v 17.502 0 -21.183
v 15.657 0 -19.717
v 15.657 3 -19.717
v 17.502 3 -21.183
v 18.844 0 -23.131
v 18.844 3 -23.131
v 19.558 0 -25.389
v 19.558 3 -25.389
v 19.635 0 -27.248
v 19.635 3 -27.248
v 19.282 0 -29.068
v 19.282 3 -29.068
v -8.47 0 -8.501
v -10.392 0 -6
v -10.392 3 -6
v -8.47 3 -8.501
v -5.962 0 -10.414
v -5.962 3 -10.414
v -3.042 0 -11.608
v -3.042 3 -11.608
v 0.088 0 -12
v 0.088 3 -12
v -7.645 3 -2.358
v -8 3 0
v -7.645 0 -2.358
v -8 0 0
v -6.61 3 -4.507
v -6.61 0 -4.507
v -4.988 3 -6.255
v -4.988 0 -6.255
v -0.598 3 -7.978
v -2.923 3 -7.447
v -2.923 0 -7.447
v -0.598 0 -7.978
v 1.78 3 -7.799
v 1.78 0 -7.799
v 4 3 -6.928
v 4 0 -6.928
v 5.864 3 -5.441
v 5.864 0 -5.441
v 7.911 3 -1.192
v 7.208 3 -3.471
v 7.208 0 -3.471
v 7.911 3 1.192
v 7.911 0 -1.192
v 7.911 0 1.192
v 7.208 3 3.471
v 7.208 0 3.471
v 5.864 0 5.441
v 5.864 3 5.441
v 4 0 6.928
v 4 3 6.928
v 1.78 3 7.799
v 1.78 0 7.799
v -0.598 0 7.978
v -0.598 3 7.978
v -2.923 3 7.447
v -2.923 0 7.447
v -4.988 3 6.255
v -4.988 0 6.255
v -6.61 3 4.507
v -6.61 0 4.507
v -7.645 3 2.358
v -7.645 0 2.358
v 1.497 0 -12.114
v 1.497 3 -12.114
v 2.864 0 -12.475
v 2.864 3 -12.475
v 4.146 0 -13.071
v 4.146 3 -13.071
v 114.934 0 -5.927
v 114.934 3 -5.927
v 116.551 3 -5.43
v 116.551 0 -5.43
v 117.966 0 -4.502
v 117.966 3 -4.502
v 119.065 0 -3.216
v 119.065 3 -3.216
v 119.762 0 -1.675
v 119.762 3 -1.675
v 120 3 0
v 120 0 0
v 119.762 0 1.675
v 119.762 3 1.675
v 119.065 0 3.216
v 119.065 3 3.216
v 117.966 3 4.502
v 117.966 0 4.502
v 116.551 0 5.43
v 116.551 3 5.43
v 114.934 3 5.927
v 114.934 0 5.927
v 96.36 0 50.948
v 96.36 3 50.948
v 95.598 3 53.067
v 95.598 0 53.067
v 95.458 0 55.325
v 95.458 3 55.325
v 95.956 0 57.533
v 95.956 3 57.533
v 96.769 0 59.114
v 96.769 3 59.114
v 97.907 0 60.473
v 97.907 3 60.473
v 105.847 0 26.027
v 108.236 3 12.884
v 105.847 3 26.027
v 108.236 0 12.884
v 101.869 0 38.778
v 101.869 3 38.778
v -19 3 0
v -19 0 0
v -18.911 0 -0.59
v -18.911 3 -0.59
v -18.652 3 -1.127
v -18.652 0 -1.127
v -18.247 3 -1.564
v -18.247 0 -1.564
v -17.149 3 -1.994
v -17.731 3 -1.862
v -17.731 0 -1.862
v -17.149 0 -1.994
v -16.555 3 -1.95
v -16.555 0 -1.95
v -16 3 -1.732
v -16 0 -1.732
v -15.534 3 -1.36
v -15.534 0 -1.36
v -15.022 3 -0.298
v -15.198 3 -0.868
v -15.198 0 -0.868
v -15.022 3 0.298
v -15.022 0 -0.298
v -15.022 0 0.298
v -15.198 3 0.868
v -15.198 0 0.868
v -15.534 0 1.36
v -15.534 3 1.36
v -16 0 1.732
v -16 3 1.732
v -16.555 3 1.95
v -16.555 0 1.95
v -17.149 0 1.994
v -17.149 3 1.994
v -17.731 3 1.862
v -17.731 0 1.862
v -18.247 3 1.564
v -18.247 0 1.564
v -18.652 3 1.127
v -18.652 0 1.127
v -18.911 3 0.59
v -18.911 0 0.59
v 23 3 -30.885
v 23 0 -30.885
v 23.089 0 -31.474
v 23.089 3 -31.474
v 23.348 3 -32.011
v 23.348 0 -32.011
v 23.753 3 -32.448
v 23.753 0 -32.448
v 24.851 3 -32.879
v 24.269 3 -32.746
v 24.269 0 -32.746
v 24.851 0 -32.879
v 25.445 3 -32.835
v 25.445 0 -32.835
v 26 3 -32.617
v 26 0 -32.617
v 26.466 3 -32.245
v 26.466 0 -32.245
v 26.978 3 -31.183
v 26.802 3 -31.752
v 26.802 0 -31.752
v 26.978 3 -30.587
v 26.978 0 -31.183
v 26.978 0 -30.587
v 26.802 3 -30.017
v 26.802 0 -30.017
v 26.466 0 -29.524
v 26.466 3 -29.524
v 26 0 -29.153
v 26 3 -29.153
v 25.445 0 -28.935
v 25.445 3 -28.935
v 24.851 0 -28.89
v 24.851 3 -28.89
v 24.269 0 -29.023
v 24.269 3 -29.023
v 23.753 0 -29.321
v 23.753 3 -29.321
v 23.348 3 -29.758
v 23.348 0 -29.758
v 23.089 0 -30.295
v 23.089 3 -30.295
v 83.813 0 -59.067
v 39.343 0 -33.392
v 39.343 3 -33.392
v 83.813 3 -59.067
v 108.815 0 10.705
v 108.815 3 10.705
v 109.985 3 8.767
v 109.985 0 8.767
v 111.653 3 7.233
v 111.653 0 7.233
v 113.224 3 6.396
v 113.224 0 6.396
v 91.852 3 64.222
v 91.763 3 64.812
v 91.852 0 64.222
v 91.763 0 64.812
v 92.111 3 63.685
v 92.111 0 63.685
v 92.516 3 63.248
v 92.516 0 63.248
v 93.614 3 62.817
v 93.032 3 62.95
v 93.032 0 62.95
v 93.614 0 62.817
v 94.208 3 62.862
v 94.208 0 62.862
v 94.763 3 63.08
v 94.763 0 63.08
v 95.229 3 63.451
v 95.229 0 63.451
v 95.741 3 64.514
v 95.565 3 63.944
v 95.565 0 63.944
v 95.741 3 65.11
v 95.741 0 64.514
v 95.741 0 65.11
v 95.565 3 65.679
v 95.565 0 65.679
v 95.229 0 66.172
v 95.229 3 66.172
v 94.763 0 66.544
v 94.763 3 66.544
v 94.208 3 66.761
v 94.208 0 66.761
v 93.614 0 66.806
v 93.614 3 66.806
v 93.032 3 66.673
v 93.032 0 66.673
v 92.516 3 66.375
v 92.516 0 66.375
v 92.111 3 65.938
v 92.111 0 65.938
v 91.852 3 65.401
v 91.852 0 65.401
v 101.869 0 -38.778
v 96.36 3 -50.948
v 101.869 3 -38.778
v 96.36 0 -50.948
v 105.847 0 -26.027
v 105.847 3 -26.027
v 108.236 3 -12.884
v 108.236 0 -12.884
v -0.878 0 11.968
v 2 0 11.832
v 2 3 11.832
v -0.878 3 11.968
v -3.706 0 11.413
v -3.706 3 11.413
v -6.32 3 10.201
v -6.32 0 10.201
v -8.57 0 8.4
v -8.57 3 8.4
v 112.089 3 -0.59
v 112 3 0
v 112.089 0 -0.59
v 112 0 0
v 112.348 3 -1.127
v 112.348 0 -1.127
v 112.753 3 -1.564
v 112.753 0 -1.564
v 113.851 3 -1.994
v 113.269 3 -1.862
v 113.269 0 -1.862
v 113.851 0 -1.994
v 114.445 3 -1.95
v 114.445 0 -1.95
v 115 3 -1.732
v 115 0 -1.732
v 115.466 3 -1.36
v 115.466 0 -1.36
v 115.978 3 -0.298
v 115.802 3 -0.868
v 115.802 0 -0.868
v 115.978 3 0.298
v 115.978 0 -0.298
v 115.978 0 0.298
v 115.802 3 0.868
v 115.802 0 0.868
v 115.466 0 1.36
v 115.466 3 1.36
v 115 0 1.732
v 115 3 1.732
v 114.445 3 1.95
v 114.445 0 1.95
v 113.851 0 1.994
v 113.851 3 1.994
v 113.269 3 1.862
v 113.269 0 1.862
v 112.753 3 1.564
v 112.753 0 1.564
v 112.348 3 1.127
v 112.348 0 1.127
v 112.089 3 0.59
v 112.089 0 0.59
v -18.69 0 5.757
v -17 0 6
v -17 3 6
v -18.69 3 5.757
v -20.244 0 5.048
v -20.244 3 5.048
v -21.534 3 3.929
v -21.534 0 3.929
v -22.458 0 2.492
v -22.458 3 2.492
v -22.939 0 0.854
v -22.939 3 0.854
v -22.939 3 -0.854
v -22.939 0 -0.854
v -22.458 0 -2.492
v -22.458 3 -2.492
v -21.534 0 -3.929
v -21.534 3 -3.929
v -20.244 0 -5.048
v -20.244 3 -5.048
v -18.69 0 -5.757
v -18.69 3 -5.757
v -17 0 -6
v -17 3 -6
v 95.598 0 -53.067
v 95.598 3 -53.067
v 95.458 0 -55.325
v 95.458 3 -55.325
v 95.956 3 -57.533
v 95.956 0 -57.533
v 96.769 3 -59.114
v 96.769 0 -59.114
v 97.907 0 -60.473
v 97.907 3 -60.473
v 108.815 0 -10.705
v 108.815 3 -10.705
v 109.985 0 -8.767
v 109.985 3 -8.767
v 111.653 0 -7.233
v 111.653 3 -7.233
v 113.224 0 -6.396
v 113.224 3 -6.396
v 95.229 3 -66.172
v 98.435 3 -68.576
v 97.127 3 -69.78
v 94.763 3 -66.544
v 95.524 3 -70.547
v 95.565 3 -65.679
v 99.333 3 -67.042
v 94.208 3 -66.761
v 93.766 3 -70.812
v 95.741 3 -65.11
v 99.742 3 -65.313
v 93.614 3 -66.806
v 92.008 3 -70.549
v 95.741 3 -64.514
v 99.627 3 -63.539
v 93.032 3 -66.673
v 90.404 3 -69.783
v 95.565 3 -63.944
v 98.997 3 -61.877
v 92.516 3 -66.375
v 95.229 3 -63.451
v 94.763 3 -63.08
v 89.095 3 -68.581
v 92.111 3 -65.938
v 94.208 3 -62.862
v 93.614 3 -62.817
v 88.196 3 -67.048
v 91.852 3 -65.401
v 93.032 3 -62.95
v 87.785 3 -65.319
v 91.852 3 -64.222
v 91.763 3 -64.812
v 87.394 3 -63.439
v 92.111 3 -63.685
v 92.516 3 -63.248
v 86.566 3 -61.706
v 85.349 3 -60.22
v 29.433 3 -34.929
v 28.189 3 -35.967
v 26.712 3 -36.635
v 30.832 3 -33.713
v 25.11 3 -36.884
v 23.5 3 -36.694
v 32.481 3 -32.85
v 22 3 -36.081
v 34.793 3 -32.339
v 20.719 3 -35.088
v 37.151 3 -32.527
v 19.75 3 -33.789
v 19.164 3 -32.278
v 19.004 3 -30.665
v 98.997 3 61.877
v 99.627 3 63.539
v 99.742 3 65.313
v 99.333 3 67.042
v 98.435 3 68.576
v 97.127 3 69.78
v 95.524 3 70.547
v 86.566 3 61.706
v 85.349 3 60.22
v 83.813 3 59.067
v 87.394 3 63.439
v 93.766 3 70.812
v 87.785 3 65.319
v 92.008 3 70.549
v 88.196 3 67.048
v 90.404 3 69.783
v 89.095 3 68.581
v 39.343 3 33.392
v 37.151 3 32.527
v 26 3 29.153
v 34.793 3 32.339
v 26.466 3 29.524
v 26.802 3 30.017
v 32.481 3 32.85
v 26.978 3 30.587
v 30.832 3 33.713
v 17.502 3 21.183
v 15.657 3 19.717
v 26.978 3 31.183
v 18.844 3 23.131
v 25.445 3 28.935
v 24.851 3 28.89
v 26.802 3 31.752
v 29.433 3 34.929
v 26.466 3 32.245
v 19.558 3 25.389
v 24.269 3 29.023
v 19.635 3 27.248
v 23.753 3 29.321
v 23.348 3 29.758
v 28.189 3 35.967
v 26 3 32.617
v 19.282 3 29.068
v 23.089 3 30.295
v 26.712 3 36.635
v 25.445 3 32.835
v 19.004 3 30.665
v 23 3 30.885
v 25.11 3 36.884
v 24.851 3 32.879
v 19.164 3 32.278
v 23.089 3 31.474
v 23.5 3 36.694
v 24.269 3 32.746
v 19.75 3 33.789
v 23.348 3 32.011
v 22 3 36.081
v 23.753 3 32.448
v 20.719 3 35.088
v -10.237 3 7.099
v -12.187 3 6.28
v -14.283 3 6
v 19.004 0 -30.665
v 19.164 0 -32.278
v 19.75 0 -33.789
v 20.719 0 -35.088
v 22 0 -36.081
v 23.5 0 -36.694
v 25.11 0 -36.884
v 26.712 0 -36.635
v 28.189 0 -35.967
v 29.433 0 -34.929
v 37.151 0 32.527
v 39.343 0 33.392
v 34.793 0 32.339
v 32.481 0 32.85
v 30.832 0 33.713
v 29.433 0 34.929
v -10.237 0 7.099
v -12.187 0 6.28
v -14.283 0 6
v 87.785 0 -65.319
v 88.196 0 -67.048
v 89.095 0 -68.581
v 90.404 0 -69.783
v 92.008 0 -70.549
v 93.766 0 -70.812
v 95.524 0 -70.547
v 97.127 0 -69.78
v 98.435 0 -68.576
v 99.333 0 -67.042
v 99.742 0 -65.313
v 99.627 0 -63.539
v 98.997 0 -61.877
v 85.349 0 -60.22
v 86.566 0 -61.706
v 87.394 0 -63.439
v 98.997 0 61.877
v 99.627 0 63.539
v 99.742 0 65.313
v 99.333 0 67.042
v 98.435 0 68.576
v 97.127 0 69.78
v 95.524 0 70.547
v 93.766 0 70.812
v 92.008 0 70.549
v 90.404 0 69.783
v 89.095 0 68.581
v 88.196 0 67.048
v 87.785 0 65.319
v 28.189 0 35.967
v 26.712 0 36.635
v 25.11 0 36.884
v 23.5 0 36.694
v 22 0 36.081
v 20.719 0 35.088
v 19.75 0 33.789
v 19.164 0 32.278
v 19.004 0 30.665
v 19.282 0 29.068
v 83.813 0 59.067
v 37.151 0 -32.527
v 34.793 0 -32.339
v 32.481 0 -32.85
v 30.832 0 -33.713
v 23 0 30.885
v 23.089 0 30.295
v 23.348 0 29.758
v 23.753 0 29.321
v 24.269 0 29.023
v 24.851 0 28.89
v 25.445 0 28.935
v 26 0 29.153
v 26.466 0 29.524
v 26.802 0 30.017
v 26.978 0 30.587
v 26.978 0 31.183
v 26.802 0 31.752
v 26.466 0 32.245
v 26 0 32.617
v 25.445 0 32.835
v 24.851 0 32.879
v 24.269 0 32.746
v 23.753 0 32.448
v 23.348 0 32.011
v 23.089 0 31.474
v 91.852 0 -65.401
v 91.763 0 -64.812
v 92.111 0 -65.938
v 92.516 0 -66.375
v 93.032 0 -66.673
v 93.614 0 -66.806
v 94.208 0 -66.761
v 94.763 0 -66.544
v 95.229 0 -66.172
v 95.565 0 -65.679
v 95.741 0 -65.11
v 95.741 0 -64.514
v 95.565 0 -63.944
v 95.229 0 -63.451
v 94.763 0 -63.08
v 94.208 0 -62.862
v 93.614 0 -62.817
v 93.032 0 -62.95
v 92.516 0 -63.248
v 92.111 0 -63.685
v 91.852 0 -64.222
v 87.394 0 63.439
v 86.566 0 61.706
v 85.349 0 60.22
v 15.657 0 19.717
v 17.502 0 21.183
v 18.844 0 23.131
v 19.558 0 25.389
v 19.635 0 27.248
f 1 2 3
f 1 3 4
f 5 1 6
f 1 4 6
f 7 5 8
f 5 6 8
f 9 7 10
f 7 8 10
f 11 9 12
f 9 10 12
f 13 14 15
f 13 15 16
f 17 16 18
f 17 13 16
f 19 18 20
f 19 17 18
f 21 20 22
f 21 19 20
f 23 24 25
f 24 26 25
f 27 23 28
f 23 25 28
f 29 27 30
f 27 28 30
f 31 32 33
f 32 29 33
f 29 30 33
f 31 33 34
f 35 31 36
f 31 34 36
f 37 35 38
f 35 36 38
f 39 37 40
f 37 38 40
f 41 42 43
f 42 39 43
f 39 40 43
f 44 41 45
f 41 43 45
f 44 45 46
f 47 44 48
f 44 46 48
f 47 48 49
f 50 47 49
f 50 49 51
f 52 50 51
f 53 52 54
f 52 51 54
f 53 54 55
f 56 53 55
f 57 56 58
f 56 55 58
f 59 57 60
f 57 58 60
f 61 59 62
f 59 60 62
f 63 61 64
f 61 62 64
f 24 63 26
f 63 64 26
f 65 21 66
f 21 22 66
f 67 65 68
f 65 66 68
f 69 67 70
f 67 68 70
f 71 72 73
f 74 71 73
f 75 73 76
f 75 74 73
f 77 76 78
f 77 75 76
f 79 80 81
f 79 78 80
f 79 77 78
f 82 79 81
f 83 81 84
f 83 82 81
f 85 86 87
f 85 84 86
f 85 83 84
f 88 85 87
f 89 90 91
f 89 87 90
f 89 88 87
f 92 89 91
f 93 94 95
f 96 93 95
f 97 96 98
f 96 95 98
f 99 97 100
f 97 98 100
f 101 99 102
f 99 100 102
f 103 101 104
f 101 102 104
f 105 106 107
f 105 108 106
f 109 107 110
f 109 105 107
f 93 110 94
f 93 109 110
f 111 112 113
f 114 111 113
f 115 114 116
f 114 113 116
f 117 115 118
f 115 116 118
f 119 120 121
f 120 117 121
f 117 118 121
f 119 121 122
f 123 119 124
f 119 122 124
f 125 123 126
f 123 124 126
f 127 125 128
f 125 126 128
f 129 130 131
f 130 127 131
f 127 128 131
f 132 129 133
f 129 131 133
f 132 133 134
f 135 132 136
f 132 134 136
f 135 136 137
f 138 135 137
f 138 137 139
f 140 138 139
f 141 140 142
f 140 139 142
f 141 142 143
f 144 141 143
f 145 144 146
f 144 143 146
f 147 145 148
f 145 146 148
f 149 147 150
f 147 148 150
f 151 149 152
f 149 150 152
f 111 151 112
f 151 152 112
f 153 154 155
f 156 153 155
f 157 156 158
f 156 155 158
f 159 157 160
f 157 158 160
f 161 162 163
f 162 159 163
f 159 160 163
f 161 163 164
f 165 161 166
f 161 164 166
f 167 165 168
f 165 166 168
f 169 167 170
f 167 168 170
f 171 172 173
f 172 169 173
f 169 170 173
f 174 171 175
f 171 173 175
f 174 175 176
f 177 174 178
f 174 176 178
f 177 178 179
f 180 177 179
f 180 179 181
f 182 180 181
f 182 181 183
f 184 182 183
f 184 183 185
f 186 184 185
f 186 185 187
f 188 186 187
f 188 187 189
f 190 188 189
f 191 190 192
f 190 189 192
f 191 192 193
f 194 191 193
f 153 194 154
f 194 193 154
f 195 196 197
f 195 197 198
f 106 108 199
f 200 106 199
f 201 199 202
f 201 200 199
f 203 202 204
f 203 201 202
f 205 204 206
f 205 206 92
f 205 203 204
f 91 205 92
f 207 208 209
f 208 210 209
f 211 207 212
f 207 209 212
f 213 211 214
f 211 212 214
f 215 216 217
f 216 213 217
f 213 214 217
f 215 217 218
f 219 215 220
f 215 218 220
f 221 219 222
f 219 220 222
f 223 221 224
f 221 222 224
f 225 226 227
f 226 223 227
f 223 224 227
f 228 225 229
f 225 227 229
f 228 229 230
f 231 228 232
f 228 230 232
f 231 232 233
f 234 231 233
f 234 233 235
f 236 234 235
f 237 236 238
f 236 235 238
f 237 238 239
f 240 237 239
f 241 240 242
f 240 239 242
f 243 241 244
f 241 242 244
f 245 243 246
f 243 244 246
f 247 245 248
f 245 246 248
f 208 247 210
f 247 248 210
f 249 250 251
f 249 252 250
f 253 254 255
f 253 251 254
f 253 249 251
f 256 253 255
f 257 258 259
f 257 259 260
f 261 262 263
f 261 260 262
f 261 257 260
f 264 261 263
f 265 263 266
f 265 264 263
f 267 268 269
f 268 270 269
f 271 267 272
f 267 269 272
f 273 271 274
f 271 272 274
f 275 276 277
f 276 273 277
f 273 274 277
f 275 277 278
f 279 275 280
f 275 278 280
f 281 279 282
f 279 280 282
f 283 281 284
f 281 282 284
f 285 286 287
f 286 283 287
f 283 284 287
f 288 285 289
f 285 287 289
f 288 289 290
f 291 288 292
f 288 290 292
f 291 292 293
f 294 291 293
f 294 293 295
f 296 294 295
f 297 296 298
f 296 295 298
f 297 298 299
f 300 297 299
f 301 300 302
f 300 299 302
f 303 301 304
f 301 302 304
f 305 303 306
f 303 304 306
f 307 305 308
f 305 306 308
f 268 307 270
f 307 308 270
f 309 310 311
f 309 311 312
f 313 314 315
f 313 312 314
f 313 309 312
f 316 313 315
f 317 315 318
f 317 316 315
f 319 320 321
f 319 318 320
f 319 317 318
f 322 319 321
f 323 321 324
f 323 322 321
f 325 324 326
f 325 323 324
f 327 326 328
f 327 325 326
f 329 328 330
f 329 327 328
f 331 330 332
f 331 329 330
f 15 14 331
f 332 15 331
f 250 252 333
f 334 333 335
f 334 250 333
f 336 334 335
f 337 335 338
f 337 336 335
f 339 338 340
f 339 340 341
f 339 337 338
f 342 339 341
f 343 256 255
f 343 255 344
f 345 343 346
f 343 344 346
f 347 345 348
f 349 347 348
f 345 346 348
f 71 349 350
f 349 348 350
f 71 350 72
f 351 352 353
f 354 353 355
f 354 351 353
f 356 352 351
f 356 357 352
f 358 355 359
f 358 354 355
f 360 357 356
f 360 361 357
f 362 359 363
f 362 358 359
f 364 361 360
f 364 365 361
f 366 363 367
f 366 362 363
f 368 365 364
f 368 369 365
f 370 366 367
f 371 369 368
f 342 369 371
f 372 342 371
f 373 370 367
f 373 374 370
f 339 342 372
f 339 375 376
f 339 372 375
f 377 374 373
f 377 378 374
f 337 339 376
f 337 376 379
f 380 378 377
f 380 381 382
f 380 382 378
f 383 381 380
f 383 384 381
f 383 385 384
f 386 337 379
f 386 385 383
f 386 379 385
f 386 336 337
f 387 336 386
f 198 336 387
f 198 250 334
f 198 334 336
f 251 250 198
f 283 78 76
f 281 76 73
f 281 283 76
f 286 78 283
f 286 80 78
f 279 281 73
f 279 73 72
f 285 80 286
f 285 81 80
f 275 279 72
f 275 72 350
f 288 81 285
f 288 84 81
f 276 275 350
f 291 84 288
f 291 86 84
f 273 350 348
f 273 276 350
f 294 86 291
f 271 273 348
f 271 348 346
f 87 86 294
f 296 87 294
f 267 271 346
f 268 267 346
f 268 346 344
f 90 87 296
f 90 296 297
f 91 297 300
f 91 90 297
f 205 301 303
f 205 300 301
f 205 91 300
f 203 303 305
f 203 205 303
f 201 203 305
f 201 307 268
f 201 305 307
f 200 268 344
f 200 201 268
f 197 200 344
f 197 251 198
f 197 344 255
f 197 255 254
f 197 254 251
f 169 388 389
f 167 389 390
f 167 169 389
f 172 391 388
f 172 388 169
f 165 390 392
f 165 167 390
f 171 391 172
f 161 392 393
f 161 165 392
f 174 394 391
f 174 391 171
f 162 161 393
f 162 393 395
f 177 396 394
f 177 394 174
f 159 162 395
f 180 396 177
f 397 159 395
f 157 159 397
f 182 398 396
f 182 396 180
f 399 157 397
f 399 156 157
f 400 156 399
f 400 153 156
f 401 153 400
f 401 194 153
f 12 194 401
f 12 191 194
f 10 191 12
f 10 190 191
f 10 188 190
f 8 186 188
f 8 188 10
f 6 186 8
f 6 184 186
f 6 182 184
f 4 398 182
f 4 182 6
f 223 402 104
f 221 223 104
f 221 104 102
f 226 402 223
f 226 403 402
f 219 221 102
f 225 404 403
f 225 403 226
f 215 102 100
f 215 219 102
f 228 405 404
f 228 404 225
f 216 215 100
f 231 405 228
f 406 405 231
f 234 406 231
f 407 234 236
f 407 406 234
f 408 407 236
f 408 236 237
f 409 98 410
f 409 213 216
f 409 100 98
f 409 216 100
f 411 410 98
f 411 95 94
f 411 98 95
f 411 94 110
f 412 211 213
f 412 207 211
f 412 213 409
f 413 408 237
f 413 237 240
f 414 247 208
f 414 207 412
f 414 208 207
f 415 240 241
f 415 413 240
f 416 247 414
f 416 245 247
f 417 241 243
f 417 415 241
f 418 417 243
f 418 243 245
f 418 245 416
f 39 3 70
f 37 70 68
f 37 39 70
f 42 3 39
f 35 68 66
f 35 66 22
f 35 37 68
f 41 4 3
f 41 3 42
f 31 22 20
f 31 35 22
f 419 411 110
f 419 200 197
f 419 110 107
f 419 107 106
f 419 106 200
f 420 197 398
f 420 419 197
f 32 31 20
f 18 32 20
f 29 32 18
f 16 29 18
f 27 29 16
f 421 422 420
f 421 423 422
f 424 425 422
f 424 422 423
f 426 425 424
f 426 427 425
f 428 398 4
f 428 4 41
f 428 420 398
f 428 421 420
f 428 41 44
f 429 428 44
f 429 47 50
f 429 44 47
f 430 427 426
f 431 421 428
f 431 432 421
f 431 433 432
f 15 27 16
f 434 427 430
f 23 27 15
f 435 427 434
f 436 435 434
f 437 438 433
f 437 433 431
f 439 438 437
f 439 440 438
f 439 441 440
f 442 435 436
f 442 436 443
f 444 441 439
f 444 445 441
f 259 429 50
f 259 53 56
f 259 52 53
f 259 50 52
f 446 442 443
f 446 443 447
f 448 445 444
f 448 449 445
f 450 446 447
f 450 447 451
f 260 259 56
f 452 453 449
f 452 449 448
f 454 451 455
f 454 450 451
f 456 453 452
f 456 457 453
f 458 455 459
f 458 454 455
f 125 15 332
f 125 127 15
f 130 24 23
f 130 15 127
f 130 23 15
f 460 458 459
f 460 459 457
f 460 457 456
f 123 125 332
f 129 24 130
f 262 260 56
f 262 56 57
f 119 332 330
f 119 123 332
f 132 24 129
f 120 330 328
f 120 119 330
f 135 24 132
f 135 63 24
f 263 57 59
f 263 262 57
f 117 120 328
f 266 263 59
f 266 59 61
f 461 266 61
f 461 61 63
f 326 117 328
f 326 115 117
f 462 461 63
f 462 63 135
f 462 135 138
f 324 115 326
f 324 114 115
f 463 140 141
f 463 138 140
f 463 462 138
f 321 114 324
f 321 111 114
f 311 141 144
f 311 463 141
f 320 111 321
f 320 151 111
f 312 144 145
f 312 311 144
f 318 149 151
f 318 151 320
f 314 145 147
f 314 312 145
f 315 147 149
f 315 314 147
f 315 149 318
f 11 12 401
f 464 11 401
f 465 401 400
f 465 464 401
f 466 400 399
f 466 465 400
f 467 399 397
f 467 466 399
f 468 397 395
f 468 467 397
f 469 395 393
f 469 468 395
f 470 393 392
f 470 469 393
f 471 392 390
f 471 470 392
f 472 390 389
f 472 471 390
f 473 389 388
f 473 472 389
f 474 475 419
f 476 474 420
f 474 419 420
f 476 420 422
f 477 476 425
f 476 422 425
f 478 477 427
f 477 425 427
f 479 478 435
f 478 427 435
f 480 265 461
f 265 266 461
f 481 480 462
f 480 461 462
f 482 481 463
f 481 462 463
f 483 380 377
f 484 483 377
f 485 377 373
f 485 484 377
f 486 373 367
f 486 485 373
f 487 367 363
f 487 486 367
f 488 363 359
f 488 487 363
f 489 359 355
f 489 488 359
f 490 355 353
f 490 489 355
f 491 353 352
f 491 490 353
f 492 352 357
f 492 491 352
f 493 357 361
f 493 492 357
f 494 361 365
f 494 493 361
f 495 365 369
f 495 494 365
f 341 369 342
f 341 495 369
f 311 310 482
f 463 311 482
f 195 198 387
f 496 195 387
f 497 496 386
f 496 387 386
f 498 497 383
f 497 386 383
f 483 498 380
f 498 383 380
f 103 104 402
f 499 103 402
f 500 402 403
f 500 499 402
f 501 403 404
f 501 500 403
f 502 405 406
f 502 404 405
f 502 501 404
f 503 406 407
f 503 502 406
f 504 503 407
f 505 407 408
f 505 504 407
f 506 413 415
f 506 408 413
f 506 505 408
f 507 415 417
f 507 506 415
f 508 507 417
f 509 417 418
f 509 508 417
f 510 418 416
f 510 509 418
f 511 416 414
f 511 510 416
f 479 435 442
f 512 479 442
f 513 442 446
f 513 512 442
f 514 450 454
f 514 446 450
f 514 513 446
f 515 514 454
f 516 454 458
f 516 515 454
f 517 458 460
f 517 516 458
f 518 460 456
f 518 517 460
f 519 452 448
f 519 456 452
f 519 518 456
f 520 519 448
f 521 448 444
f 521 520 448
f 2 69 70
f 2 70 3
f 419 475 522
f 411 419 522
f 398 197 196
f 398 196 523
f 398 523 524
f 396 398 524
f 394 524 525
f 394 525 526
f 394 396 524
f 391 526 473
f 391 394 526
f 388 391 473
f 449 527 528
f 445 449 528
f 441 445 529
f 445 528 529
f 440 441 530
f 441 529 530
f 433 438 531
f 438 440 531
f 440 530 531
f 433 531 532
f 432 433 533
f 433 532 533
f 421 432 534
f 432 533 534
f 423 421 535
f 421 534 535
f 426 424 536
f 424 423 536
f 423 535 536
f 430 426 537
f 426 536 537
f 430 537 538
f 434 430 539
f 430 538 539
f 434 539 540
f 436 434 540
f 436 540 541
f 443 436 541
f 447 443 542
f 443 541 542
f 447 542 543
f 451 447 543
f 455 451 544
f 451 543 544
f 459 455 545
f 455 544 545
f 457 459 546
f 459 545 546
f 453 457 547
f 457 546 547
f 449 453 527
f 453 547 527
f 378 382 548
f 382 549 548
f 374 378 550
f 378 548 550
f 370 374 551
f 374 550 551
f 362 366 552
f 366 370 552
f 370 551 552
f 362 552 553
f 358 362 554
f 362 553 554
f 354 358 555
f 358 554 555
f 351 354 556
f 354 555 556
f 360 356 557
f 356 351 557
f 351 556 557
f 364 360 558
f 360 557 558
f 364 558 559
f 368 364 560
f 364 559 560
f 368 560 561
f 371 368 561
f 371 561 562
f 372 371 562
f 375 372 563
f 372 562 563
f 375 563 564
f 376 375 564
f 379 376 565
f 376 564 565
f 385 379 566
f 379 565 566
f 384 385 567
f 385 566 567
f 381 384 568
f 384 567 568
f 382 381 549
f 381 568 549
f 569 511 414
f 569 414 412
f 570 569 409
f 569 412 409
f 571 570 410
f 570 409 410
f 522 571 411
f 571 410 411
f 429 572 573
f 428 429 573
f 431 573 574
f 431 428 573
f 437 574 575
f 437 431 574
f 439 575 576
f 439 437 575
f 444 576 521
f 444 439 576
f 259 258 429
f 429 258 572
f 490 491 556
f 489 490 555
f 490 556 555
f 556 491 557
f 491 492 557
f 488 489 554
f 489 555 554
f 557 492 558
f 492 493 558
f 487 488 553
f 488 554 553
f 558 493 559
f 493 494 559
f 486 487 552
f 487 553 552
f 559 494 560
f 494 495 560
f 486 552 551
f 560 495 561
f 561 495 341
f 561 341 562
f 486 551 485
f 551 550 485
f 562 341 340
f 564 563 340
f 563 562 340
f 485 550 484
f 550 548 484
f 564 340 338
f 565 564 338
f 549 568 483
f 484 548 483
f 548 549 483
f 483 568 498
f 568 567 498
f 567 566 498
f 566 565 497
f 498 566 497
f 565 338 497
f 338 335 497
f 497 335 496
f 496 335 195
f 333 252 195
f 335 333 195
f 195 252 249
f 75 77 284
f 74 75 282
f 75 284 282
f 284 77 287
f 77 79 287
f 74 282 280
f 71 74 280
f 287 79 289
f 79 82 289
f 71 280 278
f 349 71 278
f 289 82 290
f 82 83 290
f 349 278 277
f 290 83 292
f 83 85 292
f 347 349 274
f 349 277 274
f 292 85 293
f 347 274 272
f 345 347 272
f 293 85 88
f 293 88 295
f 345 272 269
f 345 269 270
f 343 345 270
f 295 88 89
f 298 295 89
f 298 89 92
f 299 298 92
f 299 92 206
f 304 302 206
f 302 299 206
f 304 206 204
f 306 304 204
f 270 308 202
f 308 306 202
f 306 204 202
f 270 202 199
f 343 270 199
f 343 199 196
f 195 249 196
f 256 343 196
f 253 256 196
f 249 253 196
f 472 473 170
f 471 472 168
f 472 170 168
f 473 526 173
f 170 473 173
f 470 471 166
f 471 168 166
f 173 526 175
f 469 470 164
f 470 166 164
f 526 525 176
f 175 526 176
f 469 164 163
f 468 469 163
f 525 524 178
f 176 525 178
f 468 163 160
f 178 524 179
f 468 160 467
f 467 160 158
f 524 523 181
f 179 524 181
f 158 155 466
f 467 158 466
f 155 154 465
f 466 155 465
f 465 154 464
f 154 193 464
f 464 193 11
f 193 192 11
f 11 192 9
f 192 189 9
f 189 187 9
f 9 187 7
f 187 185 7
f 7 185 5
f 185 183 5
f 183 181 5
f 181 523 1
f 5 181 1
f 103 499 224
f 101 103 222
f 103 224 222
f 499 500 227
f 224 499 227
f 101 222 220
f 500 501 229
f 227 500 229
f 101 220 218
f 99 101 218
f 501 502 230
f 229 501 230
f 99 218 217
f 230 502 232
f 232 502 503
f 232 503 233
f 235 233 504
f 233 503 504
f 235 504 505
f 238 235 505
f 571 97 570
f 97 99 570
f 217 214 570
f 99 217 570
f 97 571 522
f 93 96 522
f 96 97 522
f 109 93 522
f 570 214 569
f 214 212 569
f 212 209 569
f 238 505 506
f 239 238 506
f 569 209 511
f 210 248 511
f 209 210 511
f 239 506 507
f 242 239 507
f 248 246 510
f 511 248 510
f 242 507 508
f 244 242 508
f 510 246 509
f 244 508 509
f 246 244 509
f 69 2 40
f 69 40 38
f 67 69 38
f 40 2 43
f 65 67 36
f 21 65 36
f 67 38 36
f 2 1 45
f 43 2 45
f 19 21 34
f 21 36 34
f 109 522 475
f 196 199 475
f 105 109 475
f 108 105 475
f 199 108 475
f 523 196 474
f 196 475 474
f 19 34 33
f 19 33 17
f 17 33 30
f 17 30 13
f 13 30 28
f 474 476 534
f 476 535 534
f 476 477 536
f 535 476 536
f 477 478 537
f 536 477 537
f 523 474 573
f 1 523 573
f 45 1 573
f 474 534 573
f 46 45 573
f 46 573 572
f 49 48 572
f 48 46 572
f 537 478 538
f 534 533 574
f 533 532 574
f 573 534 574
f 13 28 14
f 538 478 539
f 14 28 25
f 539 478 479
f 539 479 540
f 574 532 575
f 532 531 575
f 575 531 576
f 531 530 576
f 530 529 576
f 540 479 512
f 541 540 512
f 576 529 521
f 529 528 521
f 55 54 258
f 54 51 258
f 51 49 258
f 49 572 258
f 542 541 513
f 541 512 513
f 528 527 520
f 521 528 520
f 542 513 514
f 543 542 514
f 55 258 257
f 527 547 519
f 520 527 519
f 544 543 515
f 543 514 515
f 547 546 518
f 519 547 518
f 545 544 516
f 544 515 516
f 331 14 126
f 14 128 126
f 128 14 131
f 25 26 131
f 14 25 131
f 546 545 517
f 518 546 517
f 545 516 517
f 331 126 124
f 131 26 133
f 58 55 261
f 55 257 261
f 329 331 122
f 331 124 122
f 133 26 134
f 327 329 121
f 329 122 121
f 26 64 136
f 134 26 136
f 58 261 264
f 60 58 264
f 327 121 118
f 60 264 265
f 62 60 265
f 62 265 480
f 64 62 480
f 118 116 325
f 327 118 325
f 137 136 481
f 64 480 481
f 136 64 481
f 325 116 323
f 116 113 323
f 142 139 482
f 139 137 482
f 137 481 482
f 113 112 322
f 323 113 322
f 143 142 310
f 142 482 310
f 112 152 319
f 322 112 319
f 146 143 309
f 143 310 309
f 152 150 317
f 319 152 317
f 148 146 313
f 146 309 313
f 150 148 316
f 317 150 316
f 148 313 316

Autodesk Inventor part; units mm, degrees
ref_plane "YZ Plane" through (0, 0, 0) normal (1, 0, 0) x (0, 1, 0)
ref_plane "XZ Plane" through (0, 0, 0) normal (0, 1, 0) x (-1, 0, 0)
ref_plane "XY Plane" through (0, 0, 0) normal (0, 0, 1) x (1, 0, 0)
sketch "Sketch1" plane through (0, 0, 0) normal (0, 1, 0) x (-1, 0, 0)
  circle A0 centre (0, 0) radius 8
  arc A1 (-82.4777, 58.296) -> (-82.4777, -58.296) centre (0, 0) ccw construction
  arc A2 (-86.8253, 60.806) -> (-86.8253, -60.806) centre (0, 0) ccw construction
  arc A3 (-2, -11.8322) -> (-2, 11.8322) centre (0, 0) ccw
  line L0 (-2, -11.8322) -> (-89.433, -62.3116)
  arc A4 (-89.433, 62.3116) -> (-89.433, -62.3116) centre (0, 0) ccw
  line L1 (-2, 11.8322) -> (-89.433, 62.3116)
  circle A5 centre (-93.7631, -64.8116) radius 2
  circle A6 centre (-93.7631, 64.8116) radius 2
  circle A7 centre (-114, 0) radius 2
  circle A8 centre (-25, -30.8847) radius 2
  circle A9 centre (-25, 30.8847) radius 2
  circle A10 centre (17, 0) radius 2
  line L2 (10.3923, -6) -> (17, -6)
  arc A11 (17, -6) -> (17, 6) centre (17, 0) ccw
  line L3 (17, 6) -> (10.3923, 6)
  line L4 (-22.3038, -23.5546) -> (-19.8038, -27.8847)
  arc A12 (-30.1962, -33.8847) -> (-19.8038, -27.8847) centre (-25, -30.8847) ccw
  line L5 (-30.1962, -33.8847) -> (-32.6962, -29.5546)
  line L6 (-22.3038, 23.5546) -> (-19.8038, 27.8847)
  arc A13 (-19.8038, 27.8847) -> (-30.1962, 33.8847) centre (-25, 30.8847) ccw
  line L7 (-30.1962, 33.8847) -> (-32.6962, 29.5546)
  line L8 (-92.8025, 57.1726) -> (-96.9102, 59.7032)
  arc A14 (-88.567, 61.8116) -> (-96.9102, 59.7032) centre (-93.7631, 64.8116) ccw
  line L9 (-108.8347, -6) -> (-114, -6)
  arc A15 (-114, 6) -> (-114, -6) centre (-114, 0) ccw
  line L10 (-114, 6) -> (-108.8347, 6)
  line L11 (-92.8025, -57.1726) -> (-96.9102, -59.7032)
  arc A16 (-96.9102, -59.7032) -> (-88.567, -61.8116) centre (-93.7631, -64.8116) ccw
  point P0 (-109, 0)
  point P1 (12, 0)
  dimension "d0" = 16
  dimension "d1" = 101
  dimension "d3" = 12
  dimension "d6" = 60
  dimension "d7" = 2
  dimension "d8" = 5
  dimension "d9" = 3
  dimension "d10" = 4
  dimension "d12" = 5
  dimension "d13" = 5
  dimension "d14" = 5
  dimension "d15" = 5
  dimension "d16" = 5
  dimension "d17" = 5
  dimension "d18" = 25
  dimension "d19" = 6
  dimension "d20" = 6
extrude "Extrusion1" add sketch "Sketch1" along normal blind 3 contours L0 A4 L1 A3
extrude "Extrusion2" add sketch "Sketch1" along normal blind 3 contours A3 L3 A11 L2 | L4 A12 L5 L0 | A16 L11 A4 L0 | L1 L7 A13 L6 | L1 A4 L8 A14 | L9 A15 L10 A4
fillet "Fillet1" radius 8 12 edges at (32.6962, 1.5, 29.5546) (22.3038, 1.5, 23.5546) (88.567, 1.5, 61.8116) (92.8025, 1.5, 57.1726) (108.8347, 1.5, -6) (108.8347, 1.5, 6) (92.8025, 1.5, -57.1726) (88.567, 1.5, -61.8116) (32.6962, 1.5, -29.5546) (22.3038, 1.5, -23.5546) (2, 1.5, -11.8322) (-10.3923, 1.5, 6)
properties part number "RailBase" material "Polycarbonate, Clear"
